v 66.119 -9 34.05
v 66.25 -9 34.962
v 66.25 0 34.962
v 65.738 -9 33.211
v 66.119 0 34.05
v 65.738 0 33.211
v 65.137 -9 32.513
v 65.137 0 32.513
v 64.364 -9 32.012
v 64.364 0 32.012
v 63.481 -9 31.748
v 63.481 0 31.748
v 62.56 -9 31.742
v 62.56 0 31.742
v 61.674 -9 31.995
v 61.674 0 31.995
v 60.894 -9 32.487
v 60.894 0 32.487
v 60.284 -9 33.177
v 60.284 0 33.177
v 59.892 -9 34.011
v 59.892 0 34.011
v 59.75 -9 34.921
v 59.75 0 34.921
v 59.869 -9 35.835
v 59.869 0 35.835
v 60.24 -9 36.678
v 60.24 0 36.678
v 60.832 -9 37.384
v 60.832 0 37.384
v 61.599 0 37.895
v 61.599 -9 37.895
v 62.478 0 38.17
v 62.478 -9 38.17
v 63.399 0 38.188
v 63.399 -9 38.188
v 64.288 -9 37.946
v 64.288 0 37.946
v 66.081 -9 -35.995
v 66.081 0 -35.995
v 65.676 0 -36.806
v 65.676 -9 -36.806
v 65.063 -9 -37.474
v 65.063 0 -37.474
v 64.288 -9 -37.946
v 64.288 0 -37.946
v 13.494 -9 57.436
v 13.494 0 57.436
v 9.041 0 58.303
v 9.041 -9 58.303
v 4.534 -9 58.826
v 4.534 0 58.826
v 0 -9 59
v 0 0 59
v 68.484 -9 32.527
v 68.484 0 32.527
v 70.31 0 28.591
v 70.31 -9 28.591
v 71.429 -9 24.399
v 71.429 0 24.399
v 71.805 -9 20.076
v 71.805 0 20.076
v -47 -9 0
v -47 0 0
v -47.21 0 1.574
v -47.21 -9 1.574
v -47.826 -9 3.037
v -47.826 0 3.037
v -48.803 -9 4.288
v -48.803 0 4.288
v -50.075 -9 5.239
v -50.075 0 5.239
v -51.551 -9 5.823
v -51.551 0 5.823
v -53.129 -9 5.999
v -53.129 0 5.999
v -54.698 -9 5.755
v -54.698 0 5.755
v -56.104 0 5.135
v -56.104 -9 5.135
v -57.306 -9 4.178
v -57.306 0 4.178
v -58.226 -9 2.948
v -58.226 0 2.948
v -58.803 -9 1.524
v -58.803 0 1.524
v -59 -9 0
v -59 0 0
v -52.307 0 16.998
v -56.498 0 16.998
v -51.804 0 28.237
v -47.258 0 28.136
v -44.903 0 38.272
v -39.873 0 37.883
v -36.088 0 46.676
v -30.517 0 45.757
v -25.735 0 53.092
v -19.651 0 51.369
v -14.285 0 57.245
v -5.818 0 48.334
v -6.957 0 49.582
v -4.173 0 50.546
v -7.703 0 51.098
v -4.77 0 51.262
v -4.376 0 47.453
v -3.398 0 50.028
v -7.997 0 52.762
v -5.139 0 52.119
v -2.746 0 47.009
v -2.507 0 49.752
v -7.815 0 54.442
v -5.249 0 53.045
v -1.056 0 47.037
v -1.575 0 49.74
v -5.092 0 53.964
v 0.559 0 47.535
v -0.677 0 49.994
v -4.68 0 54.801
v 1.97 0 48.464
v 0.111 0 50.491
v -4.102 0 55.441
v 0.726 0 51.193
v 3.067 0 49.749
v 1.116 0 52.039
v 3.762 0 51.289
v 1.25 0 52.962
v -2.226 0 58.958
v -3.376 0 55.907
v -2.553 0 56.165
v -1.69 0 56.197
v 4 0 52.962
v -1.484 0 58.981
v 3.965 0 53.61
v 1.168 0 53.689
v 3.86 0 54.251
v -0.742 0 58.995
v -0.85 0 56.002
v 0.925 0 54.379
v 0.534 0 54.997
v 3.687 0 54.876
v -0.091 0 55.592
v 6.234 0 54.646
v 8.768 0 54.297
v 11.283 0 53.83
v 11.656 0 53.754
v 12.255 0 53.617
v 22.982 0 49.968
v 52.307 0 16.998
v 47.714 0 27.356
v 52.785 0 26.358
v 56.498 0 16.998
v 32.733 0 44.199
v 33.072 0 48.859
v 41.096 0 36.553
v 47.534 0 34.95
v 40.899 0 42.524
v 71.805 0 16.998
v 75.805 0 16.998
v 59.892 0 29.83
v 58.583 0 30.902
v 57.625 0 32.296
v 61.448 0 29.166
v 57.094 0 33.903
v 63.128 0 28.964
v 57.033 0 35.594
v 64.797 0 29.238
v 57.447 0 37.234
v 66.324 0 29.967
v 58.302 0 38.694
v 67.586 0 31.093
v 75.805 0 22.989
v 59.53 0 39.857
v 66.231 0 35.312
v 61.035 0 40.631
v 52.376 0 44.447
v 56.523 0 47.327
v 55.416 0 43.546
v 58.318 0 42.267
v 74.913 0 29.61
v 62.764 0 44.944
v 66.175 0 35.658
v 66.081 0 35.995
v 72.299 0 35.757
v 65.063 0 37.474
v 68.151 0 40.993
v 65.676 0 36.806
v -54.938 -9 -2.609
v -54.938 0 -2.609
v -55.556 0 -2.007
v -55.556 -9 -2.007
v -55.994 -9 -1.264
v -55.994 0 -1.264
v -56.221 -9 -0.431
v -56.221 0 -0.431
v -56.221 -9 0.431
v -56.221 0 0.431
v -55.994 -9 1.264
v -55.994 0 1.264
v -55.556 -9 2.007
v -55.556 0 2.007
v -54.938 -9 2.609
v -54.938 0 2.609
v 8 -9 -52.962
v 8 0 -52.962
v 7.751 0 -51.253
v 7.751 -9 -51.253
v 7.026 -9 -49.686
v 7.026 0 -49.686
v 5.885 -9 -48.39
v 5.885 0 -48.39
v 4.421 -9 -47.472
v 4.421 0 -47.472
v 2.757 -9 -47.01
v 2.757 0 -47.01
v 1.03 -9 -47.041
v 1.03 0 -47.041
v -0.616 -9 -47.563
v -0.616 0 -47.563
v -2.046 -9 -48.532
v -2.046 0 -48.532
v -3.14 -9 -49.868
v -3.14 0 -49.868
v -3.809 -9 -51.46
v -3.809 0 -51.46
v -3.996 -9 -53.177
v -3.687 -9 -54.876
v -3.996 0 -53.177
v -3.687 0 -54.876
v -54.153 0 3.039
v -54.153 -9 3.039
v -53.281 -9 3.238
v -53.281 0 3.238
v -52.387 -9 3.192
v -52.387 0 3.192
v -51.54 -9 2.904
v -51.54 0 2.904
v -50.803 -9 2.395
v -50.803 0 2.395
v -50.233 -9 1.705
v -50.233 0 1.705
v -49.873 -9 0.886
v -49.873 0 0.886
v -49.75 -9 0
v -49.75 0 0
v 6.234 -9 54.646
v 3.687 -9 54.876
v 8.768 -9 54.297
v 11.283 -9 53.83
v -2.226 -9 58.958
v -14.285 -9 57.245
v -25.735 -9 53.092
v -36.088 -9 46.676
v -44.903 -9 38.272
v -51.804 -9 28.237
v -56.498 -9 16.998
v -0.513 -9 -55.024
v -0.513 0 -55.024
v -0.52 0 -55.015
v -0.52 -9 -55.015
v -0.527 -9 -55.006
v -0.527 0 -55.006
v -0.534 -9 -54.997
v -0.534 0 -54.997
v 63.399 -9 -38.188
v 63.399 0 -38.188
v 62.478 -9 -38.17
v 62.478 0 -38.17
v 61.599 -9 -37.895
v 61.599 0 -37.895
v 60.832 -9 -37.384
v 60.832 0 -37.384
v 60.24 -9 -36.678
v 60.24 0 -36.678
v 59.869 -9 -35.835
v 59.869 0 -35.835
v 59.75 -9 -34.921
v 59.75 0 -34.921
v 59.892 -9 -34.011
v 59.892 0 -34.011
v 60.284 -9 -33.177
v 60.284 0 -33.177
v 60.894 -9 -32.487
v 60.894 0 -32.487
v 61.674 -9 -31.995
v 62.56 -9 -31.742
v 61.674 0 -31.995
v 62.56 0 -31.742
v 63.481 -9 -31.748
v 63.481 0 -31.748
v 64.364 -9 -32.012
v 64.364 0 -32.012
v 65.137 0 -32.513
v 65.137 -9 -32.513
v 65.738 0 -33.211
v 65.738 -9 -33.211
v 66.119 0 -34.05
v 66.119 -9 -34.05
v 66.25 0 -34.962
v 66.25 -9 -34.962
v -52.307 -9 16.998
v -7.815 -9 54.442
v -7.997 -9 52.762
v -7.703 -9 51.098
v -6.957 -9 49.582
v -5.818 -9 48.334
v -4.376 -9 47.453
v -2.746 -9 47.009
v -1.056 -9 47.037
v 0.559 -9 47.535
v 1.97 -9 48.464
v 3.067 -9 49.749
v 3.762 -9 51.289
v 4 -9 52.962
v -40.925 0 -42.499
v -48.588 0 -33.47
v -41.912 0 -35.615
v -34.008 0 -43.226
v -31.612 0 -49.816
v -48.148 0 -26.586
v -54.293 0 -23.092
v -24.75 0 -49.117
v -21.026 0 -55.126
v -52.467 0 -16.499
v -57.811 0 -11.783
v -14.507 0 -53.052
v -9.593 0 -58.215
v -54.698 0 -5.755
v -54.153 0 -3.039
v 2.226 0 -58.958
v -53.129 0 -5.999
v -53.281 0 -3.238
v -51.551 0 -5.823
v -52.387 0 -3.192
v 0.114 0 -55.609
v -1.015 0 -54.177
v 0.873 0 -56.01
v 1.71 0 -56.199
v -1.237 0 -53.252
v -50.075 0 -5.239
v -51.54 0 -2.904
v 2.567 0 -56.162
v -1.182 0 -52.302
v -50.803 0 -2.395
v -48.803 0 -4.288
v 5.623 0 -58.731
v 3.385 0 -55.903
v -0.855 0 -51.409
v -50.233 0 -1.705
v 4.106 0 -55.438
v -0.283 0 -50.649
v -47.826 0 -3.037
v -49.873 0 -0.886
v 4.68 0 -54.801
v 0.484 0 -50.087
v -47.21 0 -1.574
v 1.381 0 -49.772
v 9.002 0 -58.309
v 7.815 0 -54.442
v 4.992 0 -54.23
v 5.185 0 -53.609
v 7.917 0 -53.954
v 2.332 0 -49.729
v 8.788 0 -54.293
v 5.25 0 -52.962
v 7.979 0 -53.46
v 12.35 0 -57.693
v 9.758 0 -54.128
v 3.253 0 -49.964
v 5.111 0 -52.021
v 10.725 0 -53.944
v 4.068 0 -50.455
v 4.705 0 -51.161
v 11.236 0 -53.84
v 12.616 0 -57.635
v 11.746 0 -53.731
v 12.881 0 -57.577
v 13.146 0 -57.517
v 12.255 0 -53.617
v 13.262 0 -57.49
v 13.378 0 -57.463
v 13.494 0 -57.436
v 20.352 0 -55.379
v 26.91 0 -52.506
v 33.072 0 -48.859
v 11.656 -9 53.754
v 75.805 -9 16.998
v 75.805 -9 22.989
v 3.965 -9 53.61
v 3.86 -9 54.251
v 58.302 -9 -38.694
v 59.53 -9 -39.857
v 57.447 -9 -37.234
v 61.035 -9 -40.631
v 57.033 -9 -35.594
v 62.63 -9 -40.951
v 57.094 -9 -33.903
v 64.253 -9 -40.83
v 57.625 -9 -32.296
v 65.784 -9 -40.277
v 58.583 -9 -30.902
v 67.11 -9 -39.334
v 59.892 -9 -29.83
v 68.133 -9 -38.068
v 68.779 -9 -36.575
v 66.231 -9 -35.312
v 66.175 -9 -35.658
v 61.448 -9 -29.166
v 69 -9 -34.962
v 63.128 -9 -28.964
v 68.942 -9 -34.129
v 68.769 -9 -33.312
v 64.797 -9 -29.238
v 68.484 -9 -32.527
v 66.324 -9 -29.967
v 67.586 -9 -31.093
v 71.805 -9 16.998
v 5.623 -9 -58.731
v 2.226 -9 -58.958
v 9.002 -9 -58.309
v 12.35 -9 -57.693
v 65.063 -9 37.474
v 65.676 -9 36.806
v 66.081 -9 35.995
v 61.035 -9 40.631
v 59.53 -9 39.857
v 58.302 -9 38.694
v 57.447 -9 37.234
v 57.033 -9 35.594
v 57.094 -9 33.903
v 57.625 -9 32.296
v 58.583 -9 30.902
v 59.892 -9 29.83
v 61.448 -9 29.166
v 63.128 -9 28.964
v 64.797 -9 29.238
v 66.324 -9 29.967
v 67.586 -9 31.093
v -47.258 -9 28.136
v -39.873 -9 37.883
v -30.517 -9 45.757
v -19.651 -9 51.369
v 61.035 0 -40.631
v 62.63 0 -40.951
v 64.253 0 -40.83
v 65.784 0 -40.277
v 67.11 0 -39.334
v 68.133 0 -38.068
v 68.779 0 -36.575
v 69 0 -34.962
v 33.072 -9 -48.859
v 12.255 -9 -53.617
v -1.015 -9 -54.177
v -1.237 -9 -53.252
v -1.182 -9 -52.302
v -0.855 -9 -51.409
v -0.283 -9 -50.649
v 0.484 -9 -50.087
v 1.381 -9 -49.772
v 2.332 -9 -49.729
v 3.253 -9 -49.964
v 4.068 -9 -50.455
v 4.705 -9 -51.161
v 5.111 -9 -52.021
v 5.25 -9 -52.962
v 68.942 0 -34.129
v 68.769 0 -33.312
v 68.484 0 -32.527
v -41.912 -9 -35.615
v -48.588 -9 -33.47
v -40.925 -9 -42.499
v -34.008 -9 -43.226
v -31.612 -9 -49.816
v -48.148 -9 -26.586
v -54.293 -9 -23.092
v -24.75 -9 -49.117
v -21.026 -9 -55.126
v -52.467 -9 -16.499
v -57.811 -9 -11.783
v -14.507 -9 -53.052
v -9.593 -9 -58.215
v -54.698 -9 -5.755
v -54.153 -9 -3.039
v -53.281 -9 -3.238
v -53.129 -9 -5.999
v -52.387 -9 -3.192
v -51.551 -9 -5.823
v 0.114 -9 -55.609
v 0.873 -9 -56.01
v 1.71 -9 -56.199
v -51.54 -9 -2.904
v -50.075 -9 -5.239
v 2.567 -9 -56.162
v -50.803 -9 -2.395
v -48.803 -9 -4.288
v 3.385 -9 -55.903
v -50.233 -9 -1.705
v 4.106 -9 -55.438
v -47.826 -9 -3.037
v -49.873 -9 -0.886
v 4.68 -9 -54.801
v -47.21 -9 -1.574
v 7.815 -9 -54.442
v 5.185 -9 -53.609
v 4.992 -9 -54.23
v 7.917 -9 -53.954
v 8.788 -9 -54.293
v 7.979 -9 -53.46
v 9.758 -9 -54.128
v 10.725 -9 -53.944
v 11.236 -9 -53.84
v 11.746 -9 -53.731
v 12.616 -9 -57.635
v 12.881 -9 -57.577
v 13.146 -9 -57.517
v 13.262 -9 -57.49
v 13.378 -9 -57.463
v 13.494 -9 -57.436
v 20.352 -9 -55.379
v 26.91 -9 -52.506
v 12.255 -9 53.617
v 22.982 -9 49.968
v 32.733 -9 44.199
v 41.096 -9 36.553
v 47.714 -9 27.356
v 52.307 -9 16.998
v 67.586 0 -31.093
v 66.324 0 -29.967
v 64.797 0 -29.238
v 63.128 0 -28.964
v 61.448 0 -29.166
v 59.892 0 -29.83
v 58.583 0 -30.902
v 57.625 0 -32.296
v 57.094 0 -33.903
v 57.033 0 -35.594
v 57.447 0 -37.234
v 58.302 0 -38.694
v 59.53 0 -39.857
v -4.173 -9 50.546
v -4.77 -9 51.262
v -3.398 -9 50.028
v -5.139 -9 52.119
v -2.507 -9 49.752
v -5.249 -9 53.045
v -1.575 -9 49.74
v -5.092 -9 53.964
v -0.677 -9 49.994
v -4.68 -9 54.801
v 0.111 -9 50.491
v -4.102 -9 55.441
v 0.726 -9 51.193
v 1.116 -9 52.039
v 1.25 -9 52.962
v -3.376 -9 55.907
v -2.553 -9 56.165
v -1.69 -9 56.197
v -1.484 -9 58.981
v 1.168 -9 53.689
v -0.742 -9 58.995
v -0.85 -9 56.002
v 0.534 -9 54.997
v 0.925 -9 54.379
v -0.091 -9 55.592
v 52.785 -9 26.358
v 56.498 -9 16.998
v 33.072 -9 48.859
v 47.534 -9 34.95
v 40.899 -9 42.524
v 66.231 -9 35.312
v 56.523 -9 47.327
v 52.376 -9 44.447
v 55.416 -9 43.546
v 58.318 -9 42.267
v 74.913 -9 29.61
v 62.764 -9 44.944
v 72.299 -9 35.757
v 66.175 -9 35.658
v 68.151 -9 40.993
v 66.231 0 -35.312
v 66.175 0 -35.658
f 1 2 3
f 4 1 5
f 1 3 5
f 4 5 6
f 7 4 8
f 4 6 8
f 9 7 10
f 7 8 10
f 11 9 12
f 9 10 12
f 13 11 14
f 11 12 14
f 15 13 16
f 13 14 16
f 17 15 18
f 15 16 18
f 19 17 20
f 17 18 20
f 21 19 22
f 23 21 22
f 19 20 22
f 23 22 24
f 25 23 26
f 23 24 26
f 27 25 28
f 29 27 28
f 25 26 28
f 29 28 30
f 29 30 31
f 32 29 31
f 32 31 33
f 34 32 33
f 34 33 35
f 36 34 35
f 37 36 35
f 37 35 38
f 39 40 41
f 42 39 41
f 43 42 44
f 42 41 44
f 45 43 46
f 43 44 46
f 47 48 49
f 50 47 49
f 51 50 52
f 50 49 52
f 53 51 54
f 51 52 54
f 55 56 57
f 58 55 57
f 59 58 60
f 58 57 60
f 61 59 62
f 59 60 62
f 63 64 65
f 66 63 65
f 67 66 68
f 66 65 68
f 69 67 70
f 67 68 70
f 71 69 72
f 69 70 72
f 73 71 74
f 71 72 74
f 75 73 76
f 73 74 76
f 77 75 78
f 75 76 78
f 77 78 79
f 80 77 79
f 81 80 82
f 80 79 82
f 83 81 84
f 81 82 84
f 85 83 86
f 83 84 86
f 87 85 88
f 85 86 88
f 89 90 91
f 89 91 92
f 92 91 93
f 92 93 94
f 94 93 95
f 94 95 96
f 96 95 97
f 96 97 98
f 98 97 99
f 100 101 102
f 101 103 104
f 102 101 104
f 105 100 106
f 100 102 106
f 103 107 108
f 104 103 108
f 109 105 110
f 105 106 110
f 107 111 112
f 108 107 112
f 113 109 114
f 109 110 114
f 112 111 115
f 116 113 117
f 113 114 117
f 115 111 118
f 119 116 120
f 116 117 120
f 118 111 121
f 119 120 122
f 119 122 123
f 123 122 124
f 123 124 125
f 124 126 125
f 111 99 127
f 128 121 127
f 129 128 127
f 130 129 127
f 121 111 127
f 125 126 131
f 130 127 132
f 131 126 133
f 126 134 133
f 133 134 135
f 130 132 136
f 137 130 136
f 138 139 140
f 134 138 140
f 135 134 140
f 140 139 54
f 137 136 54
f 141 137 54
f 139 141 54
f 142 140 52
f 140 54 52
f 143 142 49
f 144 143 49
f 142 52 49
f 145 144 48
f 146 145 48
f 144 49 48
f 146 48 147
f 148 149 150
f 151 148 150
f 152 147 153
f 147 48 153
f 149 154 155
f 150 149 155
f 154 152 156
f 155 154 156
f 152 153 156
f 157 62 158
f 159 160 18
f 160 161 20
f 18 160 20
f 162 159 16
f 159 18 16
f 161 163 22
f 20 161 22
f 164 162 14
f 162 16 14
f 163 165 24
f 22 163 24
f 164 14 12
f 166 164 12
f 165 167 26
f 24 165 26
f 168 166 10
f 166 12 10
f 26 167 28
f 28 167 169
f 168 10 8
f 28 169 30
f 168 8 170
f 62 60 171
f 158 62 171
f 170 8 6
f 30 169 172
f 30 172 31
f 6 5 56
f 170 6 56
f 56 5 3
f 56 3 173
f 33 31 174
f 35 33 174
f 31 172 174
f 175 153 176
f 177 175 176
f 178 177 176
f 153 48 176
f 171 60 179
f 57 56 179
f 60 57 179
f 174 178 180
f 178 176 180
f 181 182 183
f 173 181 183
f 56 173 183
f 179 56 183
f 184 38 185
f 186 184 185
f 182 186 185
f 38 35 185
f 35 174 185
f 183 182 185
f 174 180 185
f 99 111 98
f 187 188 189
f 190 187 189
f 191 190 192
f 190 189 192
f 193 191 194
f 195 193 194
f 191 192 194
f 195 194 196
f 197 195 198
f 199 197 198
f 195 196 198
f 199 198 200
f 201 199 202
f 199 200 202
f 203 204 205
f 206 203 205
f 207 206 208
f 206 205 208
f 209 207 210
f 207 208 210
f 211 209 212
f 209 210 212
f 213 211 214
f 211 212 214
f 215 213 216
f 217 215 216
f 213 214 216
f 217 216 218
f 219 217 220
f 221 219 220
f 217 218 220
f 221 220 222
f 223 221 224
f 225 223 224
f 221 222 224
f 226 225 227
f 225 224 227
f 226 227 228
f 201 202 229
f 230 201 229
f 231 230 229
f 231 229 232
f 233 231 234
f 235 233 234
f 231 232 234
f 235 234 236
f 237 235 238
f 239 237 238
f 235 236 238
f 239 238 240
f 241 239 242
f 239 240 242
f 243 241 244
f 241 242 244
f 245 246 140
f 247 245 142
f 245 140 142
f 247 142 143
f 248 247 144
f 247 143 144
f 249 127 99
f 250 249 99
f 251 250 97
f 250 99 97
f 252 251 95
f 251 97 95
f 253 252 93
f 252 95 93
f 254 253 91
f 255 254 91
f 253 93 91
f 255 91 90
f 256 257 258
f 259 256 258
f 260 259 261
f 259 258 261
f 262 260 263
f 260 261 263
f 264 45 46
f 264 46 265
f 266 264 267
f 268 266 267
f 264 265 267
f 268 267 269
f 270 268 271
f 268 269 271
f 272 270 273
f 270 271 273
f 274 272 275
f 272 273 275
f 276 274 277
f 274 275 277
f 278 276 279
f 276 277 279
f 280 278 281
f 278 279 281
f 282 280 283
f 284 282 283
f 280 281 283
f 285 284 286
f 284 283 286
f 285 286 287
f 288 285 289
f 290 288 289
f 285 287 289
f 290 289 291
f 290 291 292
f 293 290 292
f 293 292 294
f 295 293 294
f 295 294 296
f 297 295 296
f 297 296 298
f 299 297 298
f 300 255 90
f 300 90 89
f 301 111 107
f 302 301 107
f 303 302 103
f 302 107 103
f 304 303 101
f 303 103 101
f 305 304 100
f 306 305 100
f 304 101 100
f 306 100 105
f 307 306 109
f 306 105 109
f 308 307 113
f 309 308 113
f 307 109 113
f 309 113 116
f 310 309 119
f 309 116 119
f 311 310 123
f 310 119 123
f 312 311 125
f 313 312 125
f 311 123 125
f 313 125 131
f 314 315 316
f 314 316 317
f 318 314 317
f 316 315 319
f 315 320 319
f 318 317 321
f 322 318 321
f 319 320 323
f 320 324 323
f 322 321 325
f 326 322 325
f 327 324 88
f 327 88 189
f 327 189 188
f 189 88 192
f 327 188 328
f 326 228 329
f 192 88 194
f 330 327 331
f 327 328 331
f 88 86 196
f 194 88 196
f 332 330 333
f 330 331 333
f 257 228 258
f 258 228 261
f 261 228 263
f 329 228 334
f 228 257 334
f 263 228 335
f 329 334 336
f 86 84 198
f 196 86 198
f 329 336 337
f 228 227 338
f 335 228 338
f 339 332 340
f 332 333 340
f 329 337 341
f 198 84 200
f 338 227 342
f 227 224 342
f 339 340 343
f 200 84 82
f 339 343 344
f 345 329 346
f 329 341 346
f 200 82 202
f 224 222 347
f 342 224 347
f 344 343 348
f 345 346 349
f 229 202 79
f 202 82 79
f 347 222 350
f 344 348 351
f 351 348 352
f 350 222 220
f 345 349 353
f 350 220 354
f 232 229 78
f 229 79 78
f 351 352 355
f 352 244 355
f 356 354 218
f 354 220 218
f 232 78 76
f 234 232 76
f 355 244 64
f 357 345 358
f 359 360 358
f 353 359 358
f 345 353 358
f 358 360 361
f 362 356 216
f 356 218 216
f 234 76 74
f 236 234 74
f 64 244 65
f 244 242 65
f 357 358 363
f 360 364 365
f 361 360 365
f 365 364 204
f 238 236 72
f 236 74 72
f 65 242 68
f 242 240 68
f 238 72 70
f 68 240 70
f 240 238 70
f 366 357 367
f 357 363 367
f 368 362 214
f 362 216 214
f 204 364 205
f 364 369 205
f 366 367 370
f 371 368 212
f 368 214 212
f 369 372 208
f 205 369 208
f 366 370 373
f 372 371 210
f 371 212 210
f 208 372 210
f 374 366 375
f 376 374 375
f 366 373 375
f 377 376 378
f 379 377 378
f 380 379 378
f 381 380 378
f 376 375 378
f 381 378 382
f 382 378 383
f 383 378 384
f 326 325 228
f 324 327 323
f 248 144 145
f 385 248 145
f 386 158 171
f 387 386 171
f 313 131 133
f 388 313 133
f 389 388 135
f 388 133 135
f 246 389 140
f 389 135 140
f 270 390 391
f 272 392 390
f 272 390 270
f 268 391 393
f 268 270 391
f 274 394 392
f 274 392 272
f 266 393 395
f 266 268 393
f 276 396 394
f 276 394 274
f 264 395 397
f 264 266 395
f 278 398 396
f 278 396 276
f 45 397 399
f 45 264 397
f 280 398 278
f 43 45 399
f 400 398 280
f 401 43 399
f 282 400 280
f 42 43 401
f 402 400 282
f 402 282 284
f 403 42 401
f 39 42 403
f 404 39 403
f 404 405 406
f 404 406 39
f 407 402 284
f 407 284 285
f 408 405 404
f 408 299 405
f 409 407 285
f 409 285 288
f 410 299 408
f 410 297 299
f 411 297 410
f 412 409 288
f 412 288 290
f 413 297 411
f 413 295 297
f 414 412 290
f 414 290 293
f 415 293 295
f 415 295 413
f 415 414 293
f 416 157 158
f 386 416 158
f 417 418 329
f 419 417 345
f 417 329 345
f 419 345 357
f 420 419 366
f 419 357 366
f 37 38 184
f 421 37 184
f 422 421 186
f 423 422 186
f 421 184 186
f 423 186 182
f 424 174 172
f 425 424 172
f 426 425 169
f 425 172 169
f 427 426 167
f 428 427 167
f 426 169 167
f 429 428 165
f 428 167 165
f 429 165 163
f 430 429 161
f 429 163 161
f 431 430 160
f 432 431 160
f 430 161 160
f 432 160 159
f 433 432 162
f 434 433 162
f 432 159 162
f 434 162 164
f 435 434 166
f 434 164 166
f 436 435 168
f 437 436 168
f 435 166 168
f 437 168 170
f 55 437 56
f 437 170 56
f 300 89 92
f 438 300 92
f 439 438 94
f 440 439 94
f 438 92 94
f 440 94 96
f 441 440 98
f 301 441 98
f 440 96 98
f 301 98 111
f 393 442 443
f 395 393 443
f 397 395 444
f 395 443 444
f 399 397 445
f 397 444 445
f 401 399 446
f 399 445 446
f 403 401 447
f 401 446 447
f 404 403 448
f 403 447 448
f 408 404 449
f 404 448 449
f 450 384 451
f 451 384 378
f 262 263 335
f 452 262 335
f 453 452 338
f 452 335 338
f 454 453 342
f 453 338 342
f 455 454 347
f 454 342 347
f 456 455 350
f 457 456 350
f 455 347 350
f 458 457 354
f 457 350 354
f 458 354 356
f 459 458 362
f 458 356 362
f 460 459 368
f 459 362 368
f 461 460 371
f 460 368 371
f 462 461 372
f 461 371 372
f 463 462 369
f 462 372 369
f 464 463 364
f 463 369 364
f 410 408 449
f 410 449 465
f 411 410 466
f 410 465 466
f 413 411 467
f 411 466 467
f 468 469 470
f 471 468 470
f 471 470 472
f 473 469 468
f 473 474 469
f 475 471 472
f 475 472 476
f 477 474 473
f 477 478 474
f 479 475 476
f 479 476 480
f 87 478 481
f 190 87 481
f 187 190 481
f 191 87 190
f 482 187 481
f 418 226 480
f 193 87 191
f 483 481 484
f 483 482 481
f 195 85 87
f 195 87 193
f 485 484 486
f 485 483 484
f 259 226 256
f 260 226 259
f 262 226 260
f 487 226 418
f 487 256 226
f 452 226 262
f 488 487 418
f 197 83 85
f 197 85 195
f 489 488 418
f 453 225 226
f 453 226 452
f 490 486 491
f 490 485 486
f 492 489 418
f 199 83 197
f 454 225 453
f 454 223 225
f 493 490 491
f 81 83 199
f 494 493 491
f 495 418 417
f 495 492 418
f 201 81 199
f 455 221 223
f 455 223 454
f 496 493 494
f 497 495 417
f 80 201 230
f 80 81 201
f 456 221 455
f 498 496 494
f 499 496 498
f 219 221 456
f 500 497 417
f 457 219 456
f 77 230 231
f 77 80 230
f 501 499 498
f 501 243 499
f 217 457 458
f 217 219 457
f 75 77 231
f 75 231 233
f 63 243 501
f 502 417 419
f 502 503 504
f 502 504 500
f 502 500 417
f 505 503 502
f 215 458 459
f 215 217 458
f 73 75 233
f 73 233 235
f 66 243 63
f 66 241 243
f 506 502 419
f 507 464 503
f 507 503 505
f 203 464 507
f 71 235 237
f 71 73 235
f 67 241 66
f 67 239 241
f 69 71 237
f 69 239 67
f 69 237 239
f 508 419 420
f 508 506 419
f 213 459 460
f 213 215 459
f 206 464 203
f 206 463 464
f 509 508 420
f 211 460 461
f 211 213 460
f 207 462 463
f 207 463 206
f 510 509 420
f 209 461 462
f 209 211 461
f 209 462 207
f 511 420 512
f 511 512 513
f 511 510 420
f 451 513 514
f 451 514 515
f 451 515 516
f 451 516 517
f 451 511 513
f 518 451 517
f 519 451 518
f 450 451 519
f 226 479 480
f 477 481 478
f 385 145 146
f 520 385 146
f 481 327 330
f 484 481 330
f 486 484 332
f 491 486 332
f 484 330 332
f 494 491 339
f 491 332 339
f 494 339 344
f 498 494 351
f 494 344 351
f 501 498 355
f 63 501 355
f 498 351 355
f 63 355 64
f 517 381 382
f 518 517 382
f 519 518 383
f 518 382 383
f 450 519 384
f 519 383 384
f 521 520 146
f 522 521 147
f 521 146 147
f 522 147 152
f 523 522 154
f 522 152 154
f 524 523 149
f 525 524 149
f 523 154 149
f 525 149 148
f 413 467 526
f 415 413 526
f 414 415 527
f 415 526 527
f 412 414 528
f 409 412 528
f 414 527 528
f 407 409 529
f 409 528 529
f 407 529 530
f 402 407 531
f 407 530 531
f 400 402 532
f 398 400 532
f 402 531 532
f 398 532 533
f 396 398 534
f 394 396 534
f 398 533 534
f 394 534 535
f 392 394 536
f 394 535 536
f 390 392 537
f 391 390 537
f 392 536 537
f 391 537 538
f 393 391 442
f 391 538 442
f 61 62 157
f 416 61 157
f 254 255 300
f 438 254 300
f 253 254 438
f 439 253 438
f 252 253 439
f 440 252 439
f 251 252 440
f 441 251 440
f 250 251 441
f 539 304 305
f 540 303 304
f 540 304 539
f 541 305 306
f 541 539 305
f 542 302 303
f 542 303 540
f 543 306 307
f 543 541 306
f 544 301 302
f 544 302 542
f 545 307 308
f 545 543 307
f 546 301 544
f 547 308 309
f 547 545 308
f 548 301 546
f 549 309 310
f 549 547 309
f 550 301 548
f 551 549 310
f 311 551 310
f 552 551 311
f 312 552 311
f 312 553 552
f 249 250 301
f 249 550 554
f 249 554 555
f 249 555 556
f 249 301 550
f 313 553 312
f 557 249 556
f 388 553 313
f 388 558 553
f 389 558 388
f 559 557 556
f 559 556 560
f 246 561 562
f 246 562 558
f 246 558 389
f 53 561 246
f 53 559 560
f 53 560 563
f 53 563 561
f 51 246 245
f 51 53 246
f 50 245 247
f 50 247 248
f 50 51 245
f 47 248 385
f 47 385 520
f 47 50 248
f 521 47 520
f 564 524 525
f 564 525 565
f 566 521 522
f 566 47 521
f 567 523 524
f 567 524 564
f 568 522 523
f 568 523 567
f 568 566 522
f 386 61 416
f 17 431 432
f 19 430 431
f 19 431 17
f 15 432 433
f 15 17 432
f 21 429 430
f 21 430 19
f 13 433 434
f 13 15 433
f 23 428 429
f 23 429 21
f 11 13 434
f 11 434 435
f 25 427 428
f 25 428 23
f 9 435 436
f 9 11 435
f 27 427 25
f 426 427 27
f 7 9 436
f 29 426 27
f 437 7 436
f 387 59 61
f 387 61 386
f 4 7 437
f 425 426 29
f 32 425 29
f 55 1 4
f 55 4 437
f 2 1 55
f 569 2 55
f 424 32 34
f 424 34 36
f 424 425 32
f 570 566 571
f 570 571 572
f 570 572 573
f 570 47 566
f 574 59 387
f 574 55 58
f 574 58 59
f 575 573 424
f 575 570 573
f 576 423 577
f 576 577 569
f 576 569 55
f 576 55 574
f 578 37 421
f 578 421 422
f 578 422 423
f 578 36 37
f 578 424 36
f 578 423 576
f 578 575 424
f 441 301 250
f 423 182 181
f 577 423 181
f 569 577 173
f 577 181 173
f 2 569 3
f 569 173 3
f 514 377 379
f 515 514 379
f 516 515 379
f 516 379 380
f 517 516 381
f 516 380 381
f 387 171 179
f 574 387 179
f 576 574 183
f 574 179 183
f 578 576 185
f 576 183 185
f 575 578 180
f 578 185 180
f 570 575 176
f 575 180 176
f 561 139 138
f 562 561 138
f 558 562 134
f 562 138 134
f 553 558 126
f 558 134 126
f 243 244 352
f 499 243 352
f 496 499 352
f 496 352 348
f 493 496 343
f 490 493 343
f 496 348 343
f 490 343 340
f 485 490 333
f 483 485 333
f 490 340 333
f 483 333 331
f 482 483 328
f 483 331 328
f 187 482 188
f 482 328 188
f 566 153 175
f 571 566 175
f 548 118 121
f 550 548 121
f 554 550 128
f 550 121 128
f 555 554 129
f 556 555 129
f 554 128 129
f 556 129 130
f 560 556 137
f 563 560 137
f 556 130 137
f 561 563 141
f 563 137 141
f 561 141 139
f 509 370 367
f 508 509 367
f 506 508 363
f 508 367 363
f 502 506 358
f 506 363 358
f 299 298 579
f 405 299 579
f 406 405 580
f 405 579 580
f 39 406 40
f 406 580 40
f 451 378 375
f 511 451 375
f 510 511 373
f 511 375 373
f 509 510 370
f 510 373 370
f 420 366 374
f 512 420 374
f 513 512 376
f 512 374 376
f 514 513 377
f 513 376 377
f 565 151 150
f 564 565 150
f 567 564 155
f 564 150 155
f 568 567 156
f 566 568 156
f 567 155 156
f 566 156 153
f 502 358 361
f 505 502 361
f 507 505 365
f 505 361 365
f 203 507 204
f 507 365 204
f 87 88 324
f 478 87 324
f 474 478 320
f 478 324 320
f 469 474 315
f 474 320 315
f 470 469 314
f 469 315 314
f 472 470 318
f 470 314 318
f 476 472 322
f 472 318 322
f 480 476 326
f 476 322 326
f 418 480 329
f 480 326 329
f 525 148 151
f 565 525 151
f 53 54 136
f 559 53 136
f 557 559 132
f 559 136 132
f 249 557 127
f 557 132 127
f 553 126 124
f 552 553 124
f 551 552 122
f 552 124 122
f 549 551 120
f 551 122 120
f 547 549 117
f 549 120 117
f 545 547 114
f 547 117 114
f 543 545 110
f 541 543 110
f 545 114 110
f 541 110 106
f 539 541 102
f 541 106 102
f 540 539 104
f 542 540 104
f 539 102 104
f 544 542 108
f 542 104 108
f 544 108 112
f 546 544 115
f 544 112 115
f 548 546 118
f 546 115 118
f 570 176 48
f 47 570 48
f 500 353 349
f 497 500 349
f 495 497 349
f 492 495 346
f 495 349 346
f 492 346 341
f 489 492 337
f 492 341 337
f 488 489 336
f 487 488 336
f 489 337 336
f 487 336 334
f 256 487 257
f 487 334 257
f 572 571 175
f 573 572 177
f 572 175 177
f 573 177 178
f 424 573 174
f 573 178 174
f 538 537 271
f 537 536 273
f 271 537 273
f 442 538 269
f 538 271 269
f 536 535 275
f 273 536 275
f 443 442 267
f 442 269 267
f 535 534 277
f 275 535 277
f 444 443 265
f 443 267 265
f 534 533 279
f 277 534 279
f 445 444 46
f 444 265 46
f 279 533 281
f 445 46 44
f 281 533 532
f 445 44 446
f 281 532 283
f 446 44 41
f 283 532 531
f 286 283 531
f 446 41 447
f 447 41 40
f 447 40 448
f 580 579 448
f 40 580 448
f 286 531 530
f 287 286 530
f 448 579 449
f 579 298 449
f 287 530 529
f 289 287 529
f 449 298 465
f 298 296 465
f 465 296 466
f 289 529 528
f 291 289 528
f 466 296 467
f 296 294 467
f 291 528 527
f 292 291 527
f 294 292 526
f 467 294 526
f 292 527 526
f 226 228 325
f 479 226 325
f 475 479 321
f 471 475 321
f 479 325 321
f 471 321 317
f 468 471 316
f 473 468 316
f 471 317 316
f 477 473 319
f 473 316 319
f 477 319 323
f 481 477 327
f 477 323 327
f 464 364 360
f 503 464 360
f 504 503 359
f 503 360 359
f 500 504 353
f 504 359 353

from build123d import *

# Parameters (mm, degrees)
F1_DEPTH = 9


# Not quite as in the source:
# - a feature names something its author has since deleted; it is built from what else it names


with BuildPart() as f1:
    # F0 (on Front) → F1 (new body)
    with BuildSketch(Plane.XZ):
        with BuildLine():
            ThreePointArc((2.2264151739, -58.9579771996), (7.3156733339, -58.544691678), (12.3501399093, -57.6929288927))
            ThreePointArc((12.3501399093, -57.6929288927), (12.7483225231, -57.6062520292), (13.1458969739, -57.51682704))
            ThreePointArc((13.1458969739, -57.51682704), (13.3201678722, -57.4767181375), (13.4943164015, -57.4360812108))
            ThreePointArc((13.4943164015, -57.4360812108), (23.6747774831, -54.0416960423), (33.0719942338, -48.8594228108))
            Line((33.0719942338, -48.8594228108), (12.2547311497, -53.617362528))
            ThreePointArc((12.2547311497, -53.6173625279), (11.4908249672, -53.7862523474), (10.724593739, -53.9442590934))
            ThreePointArc((10.724593739, -53.9442590934), (9.2729705564, -54.2126555064), (7.8146670139, -54.4419964684))
            ThreePointArc((7.8146670139, -54.4419964684), (5.7712317605, -57.6289209346), (2.2264151739, -58.9579771996))
        make_face()
        with BuildLine():
            ThreePointArc((-59, 0), (-40.9245739425, -42.499167611), (2.2264151739, -58.9579771996))
            ThreePointArc((2.2264151739, -58.9579771996), (-1.4085405992, -57.9000488994), (-3.6865075266, -54.8763123967))
            ThreePointArc((-3.6865075266, -54.8763123967), (-38.1500265832, -39.6178680862), (-54.6981132075, -5.75468605))
            ThreePointArc((-54.6981132075, -5.75468605), (-57.8056570438, -3.5924449025), (-59, 0))
        make_face()
        with BuildLine():
            ThreePointArc((-3.6865075266, -54.8763123967), (-1.4085405992, -57.9000488994), (2.2264151739, -58.9579771996))
            ThreePointArc((2.2264151739, -58.9579771996), (5.7712317605, -57.6289209346), (7.8146670139, -54.4419964684))
            ThreePointArc((7.8146670139, -54.4419964684), (6.2499884856, -54.643733803), (4.6801675765, -54.8005112335))
            ThreePointArc((4.6801675765, -54.8005112335), (2.1395152245, -56.2092547885), (-0.5126102579, -55.023631238))
            ThreePointArc((-0.5126102579, -55.023631238), (-0.523287524, -55.0105475784), (-0.5338966616, -54.9974086149))
            ThreePointArc((-0.5338966616, -54.9974086149), (-2.11107057, -54.9594703491), (-3.6865075266, -54.8763123967))
        make_face()
        with BuildLine():
            ThreePointArc((-54.6981132075, 5.75468605), (-57.8056570438, 3.5924449025), (-59, 0))
            ThreePointArc((-59, 0), (-57.8056570438, -3.5924449025), (-54.6981132075, -5.75468605))
            ThreePointArc((-54.6981132075, -5.75468605), (-54.8406623818, -4.1835092356), (-54.9380896226, -2.6088903033))
            ThreePointArc((-54.9380896226, -2.6088903033), (-56.25, 0), (-54.9380896226, 2.6088903033))
            ThreePointArc((-54.9380896226, 2.6088903033), (-54.8406623818, 4.1835092356), (-54.6981132075, 5.75468605))
        make_face()
        with BuildLine():
            ThreePointArc((8, -52.9622507075), (1.0302178491, -47.0411424852), (-3.6865075266, -54.8763123967))
            ThreePointArc((-3.6865075266, -54.8763123967), (-2.11107057, -54.9594703491), (-0.5338966616, -54.9974086149))
            ThreePointArc((-0.5338966616, -54.9974086149), (0.9212655911, -49.8964992376), (5.25, -52.9622507075))
            ThreePointArc((5.25, -52.9622507075), (5.1042748448, -53.9245280522), (4.6801675765, -54.8005112335))
            ThreePointArc((4.6801675765, -54.8005112335), (6.2499884856, -54.643733803), (7.8146670139, -54.4419964684))
            ThreePointArc((7.8146670139, -54.4419964684), (7.953486461, -53.7079040841), (8, -52.9622507075))
        make_face()
        with BuildLine():
            ThreePointArc((-47, 0), (-49.4075550975, 4.8056570438), (-54.6981132075, 5.75468605))
            ThreePointArc((-54.6981132075, 5.75468605), (-54.8406623818, 4.1835092356), (-54.9380896226, 2.6088903033))
            ThreePointArc((-54.9380896226, 2.6088903033), (-51.5399128919, 2.9035574106), (-49.75, 0))
            ThreePointArc((-49.75, 0), (-51.5399128919, -2.9035574106), (-54.9380896226, -2.6088903033))
            ThreePointArc((-54.9380896226, -2.6088903033), (-54.8406623818, -4.1835092356), (-54.6981132075, -5.75468605))
            ThreePointArc((-54.6981132075, -5.75468605), (-49.4075550975, -4.8056570438), (-47, 0))
        make_face()
    extrude(amount=F1_DEPTH)


with BuildPart() as f1b:
    # F0 (on Front) → F1, piece 2 (new body)
    with BuildSketch(Plane.XZ):
        with BuildLine():
            ThreePointArc((-2.2264152072, 58.9579771984), (-36.0875389034, 46.6764344814), (-56.4983880681, 16.9980041683))
            Line((-56.4983880681, 16.9980041683), (-52.3074359369, 16.9980041683))
            ThreePointArc((-52.3074359369, 16.9980041683), (-35.4144032231, 42.0811126795), (-7.8146670139, 54.4419964684))
            ThreePointArc((-7.8146670139, 54.4419964684), (-5.7712317735, 57.6289209241), (-2.2264152072, 58.9579771984))
        make_face()
        with BuildLine():
            ThreePointArc((0, 59), (-1.1134058773, 58.9894933641), (-2.2264152072, 58.9579771984))
            ThreePointArc((-2.2264152072, 58.9579771984), (1.4085405854, 57.9000489088), (3.6865075266, 54.8763123967))
            ThreePointArc((3.6865075266, 54.8763123967), (7.5029468578, 54.4858310797), (11.2828817239, 53.8302571051))
            Line((11.2828817239, 53.8302571051), (11.6555883217, 53.7543010605))
            Line((11.6555883217, 53.7543010605), (12.2546497214, 53.617381139))
            Line((12.2546497214, 53.617381139), (33.0719942338, 48.8594228108))
            ThreePointArc((33.0719942338, 48.8594228108), (23.6747775211, 54.0416960256), (13.4943164822, 57.4360811919))
            ThreePointArc((13.4943164822, 57.4360811919), (6.7923195479, 58.6077161742), (0, 59))
        make_face()
        with BuildLine():
            ThreePointArc((3.6865075266, 54.8763123967), (1.4085405854, 57.9000489088), (-2.2264152072, 58.9579771984))
            ThreePointArc((-2.2264152072, 58.9579771984), (-5.7712317735, 57.6289209241), (-7.8146670139, 54.4419964684))
            ThreePointArc((-7.8146670139, 54.4419964684), (-6.2499884856, 54.643733803), (-4.6801675765, 54.8005112335))
            ThreePointArc((-4.6801675765, 54.8005112335), (-2.1226415094, 56.2099358924), (0.5338966616, 54.9974086149))
            ThreePointArc((0.5338966616, 54.9974086149), (2.11107057, 54.9594703491), (3.6865075266, 54.8763123967))
        make_face()
        with BuildLine():
            Line((52.3074359369, 16.9980041683), (56.4983880681, 16.9980041683))
            ThreePointArc((56.4983880681, 16.9980041683), (47.5342071135, 34.9499521329), (33.0719942338, 48.8594228108))
            Line((33.0719942338, 48.8594228108), (12.2546497214, 53.617381139))
            ThreePointArc((12.2546497214, 53.617381139), (37.1121330372, 40.591742774), (52.3074359369, 16.9980041683))
        make_face()
        with BuildLine():
            ThreePointArc((4, 52.9622507075), (3.9211082223, 53.9320328584), (3.6865075266, 54.8763123967))
            ThreePointArc((3.6865075266, 54.8763123967), (2.11107057, 54.9594703491), (0.5338966616, 54.9974086149))
            ThreePointArc((0.5338966616, 54.9974086149), (1.0657514699, 54.0409851163), (1.25, 52.9622507075))
            ThreePointArc((1.25, 52.9622507075), (-2.9622773447, 49.8579758627), (-4.6801675765, 54.8005112335))
            ThreePointArc((-4.6801675765, 54.8005112335), (-6.2499884856, 54.643733803), (-7.8146670139, 54.4419964684))
            ThreePointArc((-7.8146670139, 54.4419964684), (-2.7456533767, 47.0087642464), (4, 52.9622507075))
        make_face()
        with BuildLine():
            ThreePointArc((13.4943164822, 57.4360811919), (23.6747775211, 54.0416960256), (33.0719942338, 48.8594228108))
            Line((33.0719942338, 48.8594228108), (52.3755635072, 44.4474490293))
            ThreePointArc((52.3755635072, 44.4474490293), (56.8873510456, 42.9527914166), (61.0347281001, 40.631263528))
            ThreePointArc((61.0347281001, 40.631263528), (66.4791068251, 39.8505853625), (69, 34.9622507075))
            ThreePointArc((69, 34.9622507075), (68.8695285228, 33.7178090977), (68.48378836, 32.5274888663))
            ThreePointArc((68.48378836, 32.5274888663), (70.9606299497, 26.5193970545), (71.8052681793, 20.0759121479))
            Line((71.8052681793, 20.0759121479), (71.8052681793, 16.9980041683))
            Line((71.8052681793, 16.9980041683), (75.8052681793, 16.9980041683))
            Line((75.8052681793, 16.9980041683), (75.8052681793, 22.9893407228))
            ThreePointArc((75.8052681793, 22.9893407228), (70.4005260997, 38.5143485177), (56.5231988167, 47.3266632794))
            Line((56.5231988167, 47.3266632794), (13.4943164822, 57.4360811919))
        make_face()
        with BuildLine():
            ThreePointArc((64.2884750409, 37.9459283155), (62.7183466029, 39.3573523193), (61.0347281001, 40.631263528))
            ThreePointArc((61.0347281001, 40.631263528), (58.5826727015, 30.901804976), (68.48378836, 32.5274888663))
            ThreePointArc((68.48378836, 32.5274888663), (67.3558810778, 34.3122146697), (66.0814094211, 35.9954089623))
            ThreePointArc((66.0814094211, 35.9954089623), (66.2075754565, 35.4856622957), (66.25, 34.9622507075))
            ThreePointArc((66.25, 34.9622507075), (60.2843008374, 33.1768997452), (64.2884750409, 37.9459283155))
        make_face()
        with BuildLine():
            ThreePointArc((69, 34.9622507075), (66.4791068251, 39.8505853625), (61.0347281001, 40.631263528))
            ThreePointArc((61.0347281001, 40.631263528), (62.7183466029, 39.3573523193), (64.2884750409, 37.9459283155))
            ThreePointArc((64.2884750409, 37.9459283155), (65.3927189533, 37.161658812), (66.0814094211, 35.9954089623))
            ThreePointArc((66.0814094211, 35.9954089623), (67.3558810778, 34.3122146697), (68.48378836, 32.5274888663))
            ThreePointArc((68.48378836, 32.5274888663), (68.8695285228, 33.7178090977), (69, 34.9622507075))
        make_face()
    extrude(amount=F1_DEPTH)


with BuildPart() as f1c:
    # F0 (on Front) → F1, piece 3 (new body)
    with BuildSketch(Plane.XZ):
        with BuildLine():
            ThreePointArc((64.2884750409, -37.9459283155), (62.7183466029, -39.3573523193), (61.0347281001, -40.631263528))
            ThreePointArc((61.0347281001, -40.631263528), (66.4791068251, -39.8505853625), (69, -34.9622507075))
            ThreePointArc((69, -34.9622507075), (68.8695285228, -33.7178090977), (68.48378836, -32.5274888663))
            ThreePointArc((68.48378836, -32.5274888663), (67.3558810778, -34.3122146697), (66.0814094211, -35.9954089623))
            ThreePointArc((66.0814094211, -35.9954089623), (65.3927189533, -37.161658812), (64.2884750409, -37.9459283155))
        make_face()
        with BuildLine():
            ThreePointArc((68.48378836, -32.5274888663), (58.5826727015, -30.901804976), (61.0347281001, -40.631263528))
            ThreePointArc((61.0347281001, -40.631263528), (62.7183466029, -39.3573523193), (64.2884750409, -37.9459283155))
            ThreePointArc((64.2884750409, -37.9459283155), (60.2843008374, -33.1768997452), (66.25, -34.9622507075))
            ThreePointArc((66.25, -34.9622507075), (66.2075754565, -35.4856622957), (66.0814094211, -35.9954089623))
            ThreePointArc((66.0814094211, -35.9954089623), (67.3558810778, -34.3122146697), (68.48378836, -32.5274888663))
        make_face()
    extrude(amount=F1_DEPTH)


solid = Compound([f1.part, f1b.part, f1c.part])
